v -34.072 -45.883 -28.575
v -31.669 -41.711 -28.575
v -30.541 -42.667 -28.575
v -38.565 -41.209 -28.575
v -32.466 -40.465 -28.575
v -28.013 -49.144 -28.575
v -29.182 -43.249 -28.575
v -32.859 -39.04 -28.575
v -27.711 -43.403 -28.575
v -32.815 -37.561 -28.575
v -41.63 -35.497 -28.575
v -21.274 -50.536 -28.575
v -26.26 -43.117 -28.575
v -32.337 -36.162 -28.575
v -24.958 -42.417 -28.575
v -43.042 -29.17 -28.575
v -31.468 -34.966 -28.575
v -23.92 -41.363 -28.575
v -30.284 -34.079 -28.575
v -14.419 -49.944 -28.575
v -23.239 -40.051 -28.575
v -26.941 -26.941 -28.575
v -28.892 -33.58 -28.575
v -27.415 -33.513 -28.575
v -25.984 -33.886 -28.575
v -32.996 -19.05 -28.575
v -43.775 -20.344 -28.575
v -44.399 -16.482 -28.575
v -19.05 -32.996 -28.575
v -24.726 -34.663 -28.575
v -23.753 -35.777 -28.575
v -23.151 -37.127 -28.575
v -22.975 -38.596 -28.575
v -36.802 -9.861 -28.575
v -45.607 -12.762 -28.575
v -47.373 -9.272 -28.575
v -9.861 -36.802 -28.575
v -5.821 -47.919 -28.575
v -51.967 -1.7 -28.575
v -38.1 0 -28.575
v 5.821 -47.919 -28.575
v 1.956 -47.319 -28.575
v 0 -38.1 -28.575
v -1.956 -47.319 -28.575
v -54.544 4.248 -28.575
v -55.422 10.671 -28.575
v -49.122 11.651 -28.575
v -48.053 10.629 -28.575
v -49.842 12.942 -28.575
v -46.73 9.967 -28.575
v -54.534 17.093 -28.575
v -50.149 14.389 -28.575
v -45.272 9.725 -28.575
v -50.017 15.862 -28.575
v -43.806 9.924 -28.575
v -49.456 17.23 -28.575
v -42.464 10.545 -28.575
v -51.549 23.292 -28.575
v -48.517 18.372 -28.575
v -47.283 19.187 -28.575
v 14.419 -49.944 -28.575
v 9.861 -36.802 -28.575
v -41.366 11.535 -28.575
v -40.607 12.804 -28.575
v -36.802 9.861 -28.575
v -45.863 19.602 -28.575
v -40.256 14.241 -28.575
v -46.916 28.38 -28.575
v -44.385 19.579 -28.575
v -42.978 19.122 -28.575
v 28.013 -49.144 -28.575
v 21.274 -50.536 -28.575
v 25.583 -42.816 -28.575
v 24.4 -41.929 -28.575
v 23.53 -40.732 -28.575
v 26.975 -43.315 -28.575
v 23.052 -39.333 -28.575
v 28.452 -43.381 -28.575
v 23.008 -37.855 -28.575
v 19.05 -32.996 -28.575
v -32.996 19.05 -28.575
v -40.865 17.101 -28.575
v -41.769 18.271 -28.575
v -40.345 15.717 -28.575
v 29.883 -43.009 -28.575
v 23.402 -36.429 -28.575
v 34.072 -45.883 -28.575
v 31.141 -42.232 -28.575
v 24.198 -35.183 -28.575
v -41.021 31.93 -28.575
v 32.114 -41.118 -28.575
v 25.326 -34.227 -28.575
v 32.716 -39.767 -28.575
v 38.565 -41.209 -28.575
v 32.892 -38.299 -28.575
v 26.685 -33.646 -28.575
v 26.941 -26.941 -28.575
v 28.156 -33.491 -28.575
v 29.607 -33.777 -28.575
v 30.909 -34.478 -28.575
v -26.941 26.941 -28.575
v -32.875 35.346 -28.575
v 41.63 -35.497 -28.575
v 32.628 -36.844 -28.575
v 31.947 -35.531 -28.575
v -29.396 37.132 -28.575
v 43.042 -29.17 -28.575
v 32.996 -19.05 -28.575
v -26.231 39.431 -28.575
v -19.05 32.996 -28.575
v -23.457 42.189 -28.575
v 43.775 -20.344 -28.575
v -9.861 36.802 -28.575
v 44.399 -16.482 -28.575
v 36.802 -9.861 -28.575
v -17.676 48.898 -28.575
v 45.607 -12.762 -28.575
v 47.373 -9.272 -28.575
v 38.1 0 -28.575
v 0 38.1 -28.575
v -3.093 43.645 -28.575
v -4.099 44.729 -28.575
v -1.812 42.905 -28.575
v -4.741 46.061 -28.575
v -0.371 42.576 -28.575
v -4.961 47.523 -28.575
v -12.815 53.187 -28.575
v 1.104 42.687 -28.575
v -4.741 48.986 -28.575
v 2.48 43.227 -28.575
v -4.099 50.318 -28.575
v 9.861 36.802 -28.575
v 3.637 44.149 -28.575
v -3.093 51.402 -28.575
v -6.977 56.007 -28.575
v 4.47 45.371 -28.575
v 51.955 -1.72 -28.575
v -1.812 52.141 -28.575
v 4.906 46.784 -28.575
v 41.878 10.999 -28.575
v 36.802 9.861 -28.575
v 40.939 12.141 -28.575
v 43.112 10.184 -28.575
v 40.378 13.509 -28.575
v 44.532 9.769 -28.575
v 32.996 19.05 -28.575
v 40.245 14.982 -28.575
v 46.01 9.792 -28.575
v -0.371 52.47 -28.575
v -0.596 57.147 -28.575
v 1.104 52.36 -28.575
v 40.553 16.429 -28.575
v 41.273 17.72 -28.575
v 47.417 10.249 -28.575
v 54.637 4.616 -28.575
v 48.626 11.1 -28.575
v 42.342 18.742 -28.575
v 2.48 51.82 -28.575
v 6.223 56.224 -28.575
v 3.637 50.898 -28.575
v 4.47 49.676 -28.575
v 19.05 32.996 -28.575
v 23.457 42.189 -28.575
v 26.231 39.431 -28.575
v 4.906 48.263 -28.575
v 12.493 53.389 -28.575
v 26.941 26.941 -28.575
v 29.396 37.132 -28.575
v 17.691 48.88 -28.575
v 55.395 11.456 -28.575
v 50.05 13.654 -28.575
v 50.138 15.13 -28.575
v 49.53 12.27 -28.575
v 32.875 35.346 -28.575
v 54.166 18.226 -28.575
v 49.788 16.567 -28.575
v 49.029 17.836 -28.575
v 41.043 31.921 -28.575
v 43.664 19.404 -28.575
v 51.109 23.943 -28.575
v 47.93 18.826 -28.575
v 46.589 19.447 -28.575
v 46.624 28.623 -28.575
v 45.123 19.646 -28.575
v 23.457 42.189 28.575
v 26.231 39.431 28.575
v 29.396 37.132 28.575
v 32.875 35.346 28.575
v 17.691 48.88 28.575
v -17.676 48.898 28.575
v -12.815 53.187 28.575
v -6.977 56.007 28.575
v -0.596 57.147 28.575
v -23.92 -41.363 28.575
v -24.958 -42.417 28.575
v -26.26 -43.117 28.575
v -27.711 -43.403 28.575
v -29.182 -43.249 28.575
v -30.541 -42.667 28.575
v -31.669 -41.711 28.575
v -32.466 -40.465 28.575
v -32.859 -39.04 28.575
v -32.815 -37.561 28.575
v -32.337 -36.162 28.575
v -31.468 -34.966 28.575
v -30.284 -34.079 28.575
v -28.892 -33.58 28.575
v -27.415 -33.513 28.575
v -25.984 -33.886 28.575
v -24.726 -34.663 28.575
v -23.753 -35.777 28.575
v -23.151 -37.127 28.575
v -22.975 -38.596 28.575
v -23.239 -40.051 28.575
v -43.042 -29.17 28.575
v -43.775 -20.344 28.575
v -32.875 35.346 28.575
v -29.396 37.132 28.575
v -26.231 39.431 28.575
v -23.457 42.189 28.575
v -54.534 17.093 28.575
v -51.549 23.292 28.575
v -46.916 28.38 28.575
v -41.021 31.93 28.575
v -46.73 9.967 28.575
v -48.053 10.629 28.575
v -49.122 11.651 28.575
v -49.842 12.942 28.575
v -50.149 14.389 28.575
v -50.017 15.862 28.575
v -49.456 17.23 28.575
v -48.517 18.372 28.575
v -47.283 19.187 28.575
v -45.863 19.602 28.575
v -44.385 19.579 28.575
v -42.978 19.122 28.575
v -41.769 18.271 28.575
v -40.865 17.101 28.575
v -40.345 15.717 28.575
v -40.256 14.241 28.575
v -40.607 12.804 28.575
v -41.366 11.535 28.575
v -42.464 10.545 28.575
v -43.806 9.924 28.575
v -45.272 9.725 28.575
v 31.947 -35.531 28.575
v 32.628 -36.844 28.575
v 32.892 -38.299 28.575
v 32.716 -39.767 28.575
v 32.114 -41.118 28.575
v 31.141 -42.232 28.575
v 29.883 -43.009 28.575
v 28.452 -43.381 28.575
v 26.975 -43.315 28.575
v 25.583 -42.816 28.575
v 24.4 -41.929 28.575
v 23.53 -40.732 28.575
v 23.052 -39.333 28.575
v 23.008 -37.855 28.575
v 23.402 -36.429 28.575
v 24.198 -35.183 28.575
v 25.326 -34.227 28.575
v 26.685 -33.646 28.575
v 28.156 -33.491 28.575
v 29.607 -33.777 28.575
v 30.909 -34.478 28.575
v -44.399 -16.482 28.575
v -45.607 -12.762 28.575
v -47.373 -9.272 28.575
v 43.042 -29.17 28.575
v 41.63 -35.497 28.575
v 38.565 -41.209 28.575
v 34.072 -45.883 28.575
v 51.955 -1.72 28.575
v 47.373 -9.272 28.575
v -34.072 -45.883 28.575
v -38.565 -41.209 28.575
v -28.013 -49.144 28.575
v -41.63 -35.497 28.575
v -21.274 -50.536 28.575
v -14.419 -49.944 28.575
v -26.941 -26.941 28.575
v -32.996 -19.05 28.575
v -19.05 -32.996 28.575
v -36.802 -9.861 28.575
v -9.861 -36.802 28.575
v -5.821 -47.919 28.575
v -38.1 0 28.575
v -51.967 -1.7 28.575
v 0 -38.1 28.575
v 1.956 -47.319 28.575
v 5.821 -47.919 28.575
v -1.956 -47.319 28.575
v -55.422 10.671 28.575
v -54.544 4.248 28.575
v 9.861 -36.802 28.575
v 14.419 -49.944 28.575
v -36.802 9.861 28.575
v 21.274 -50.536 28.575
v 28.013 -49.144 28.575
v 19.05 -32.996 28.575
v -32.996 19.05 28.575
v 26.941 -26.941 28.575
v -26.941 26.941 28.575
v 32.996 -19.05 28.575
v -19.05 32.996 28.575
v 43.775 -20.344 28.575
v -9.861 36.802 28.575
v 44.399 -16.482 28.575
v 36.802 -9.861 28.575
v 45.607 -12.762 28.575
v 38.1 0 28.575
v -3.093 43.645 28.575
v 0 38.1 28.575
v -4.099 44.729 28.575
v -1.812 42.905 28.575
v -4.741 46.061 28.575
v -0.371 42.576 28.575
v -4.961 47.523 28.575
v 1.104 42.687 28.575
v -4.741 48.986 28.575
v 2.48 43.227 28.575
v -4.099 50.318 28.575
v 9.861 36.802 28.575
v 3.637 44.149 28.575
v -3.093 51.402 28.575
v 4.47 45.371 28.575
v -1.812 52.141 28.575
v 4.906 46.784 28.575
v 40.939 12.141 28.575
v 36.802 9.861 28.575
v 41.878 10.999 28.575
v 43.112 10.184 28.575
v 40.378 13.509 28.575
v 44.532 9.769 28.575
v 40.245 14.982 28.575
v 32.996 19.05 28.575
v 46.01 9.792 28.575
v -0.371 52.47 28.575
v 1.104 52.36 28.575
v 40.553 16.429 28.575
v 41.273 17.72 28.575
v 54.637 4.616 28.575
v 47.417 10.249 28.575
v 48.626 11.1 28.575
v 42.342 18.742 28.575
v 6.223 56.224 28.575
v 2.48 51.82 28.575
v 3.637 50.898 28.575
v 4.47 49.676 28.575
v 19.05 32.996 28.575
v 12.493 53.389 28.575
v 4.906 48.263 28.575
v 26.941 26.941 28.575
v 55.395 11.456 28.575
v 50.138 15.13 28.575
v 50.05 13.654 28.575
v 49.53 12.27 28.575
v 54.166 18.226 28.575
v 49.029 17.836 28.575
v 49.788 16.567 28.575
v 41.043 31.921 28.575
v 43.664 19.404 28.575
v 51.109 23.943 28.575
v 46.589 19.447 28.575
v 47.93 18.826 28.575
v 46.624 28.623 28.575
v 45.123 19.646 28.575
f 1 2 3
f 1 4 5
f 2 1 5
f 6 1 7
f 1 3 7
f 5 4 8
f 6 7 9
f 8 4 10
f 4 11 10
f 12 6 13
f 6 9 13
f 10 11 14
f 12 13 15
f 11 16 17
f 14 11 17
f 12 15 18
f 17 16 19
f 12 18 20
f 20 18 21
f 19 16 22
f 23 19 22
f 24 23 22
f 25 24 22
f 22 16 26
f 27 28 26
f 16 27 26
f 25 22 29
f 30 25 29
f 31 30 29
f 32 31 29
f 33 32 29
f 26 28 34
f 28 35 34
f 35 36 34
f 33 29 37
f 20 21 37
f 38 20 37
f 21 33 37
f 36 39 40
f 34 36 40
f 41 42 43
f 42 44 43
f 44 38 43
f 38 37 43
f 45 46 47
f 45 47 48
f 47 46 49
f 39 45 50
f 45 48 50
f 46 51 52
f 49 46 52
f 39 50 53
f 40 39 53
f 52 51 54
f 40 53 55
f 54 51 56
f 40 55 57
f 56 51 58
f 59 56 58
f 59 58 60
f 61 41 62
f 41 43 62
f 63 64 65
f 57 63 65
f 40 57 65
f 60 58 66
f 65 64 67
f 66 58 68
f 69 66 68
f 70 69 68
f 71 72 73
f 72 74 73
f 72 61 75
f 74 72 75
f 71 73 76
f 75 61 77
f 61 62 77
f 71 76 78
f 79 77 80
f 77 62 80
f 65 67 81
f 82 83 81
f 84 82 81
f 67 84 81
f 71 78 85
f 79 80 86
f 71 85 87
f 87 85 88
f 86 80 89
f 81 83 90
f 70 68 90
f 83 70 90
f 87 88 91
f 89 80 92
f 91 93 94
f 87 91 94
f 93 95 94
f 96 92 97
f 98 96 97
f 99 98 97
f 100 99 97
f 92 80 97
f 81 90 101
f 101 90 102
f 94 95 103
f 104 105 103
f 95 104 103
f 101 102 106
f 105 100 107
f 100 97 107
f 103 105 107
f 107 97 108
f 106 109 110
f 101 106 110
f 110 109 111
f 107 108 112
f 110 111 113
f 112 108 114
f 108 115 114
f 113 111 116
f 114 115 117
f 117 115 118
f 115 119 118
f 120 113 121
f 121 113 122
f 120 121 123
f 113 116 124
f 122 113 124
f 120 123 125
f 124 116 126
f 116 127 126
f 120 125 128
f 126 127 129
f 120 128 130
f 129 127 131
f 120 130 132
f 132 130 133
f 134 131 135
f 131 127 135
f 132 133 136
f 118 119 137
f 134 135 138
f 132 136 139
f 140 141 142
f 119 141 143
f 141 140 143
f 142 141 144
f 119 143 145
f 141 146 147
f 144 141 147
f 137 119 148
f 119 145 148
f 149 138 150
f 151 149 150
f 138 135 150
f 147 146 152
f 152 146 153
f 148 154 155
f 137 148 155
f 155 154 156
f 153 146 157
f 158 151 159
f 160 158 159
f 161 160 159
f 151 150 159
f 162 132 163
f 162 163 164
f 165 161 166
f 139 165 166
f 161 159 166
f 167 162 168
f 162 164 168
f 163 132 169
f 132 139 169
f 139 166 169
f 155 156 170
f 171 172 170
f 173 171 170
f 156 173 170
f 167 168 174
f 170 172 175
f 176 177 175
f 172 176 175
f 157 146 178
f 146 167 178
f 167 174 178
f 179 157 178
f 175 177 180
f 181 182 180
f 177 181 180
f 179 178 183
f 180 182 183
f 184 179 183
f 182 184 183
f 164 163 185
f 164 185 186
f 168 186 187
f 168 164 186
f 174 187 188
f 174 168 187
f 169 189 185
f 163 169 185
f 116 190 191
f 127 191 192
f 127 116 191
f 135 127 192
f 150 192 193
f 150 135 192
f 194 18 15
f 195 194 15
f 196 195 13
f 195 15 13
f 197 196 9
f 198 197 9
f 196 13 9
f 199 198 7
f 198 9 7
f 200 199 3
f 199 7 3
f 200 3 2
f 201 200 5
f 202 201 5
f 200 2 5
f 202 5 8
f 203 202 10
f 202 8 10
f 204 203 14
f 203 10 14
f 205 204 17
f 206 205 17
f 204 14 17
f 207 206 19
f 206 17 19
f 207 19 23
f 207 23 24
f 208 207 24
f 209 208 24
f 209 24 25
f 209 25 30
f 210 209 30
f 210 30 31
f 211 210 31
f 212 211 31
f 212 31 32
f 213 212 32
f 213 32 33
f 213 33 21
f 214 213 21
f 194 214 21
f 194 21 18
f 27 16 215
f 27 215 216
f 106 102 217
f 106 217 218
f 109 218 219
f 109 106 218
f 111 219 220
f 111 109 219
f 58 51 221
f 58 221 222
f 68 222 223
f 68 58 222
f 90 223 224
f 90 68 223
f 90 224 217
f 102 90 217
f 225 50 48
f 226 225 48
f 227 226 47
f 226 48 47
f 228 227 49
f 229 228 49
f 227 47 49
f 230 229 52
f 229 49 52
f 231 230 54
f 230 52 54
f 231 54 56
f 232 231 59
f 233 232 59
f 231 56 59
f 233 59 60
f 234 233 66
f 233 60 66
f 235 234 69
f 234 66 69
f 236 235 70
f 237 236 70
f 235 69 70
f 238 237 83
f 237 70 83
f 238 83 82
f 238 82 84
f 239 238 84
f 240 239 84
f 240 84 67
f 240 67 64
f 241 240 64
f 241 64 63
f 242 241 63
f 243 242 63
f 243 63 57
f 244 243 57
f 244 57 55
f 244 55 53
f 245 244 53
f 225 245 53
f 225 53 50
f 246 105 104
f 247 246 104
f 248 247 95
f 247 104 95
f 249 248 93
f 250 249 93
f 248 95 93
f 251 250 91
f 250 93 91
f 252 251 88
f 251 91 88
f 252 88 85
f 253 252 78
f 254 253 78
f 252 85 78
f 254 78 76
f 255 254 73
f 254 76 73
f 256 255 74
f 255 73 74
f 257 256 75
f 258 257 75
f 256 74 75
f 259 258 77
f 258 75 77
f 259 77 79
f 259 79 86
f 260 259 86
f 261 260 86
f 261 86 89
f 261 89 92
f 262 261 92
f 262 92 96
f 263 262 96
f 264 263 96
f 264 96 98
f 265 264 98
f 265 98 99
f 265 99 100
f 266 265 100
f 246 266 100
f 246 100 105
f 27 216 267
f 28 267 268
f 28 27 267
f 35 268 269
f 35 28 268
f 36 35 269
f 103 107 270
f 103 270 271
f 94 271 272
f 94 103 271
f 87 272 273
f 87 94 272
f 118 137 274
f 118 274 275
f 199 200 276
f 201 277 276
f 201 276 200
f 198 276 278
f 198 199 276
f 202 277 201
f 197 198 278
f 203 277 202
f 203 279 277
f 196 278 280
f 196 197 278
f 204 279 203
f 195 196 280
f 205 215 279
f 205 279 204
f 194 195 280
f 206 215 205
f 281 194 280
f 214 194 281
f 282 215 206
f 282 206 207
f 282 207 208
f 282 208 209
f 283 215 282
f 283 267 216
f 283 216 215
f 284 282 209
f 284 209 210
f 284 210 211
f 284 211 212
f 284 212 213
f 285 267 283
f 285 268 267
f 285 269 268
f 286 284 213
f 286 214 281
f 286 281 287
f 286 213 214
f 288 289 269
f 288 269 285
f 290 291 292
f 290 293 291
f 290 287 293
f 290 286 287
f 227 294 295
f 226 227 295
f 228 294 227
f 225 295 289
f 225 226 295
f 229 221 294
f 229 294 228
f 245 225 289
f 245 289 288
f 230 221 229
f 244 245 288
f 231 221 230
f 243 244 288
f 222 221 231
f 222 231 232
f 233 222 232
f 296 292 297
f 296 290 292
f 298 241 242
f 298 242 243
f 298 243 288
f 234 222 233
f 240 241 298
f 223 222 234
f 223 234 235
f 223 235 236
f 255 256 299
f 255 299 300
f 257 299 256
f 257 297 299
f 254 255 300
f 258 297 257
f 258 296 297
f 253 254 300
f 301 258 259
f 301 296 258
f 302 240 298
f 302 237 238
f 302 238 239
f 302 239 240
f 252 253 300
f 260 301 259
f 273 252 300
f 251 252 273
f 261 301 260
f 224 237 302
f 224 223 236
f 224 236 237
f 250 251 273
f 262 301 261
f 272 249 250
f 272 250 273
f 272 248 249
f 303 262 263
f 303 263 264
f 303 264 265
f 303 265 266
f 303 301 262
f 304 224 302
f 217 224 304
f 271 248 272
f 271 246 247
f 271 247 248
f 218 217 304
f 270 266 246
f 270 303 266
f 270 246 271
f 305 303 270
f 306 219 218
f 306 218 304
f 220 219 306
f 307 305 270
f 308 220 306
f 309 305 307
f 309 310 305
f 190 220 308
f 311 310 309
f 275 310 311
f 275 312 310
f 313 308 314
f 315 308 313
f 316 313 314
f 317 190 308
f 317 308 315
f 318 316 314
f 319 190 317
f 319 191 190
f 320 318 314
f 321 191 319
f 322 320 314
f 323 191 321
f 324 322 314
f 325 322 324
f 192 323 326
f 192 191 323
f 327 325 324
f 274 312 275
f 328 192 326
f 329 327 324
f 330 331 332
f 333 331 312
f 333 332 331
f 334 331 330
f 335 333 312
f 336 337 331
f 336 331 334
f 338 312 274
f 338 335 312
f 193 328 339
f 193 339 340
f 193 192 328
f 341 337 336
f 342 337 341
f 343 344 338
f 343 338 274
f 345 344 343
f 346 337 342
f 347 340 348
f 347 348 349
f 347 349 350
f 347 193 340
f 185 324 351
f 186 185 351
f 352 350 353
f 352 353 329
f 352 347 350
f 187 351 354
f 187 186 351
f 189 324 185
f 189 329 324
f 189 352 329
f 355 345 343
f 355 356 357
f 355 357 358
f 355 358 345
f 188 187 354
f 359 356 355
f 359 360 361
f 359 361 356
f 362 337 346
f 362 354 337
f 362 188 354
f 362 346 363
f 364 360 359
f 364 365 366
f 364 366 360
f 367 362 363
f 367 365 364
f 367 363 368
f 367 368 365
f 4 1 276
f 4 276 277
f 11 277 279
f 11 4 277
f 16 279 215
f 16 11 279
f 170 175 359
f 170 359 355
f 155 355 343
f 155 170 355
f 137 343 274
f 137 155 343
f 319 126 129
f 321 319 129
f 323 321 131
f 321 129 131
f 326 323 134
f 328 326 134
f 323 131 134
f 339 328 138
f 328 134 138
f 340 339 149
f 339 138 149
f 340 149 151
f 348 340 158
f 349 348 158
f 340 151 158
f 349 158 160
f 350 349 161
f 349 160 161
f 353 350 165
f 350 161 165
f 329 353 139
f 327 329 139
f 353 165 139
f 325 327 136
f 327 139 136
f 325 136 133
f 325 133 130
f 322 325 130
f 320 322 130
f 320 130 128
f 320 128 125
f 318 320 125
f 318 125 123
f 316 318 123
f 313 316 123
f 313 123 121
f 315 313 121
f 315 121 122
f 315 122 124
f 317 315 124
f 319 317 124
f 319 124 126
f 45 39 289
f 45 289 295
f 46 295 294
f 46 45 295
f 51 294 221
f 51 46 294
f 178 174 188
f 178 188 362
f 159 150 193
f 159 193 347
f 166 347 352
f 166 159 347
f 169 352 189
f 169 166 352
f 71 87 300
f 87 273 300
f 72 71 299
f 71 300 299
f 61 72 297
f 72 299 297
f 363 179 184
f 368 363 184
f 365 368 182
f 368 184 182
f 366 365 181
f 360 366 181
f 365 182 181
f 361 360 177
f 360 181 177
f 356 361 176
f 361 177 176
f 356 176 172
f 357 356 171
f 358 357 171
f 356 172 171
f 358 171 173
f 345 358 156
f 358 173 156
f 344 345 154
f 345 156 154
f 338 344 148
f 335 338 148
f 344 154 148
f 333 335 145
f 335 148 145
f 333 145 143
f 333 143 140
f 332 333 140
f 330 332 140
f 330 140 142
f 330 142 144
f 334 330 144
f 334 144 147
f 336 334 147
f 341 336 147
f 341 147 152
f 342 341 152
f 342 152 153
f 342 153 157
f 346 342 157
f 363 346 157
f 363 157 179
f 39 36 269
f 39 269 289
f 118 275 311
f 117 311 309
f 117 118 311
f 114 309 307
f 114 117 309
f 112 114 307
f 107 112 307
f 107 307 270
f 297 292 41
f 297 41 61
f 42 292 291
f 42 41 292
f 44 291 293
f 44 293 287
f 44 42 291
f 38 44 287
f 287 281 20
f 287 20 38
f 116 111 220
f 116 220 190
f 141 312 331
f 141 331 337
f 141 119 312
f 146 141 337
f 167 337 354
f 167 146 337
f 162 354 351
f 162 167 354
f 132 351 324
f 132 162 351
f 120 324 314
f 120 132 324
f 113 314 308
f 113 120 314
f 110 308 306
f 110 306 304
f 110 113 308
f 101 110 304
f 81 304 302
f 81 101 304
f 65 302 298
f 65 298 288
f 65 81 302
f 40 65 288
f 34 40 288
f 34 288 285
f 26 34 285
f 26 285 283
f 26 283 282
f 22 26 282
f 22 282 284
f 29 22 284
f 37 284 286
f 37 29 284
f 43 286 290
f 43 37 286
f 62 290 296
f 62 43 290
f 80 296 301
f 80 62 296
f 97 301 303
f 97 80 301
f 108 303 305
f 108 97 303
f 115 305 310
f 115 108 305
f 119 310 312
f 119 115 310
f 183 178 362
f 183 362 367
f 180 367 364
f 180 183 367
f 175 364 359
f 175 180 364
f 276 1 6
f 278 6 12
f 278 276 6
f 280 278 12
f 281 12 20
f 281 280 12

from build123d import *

# Parameters (mm, degrees)
SKETCH1_R                        = 57.15
SKETCH1_R_2                      = 38.1
BOSS_EXTRUDE1_DEPTH              = 28.575
F_25_64_0_39063_DIAMETER_HOLE2_D = 9.921875
CIRPATTERN2_COUNT                = 5
CUT_EXTRUDE2_DEPTH               = 99.986703653
FILLET1_R                        = 23.8125
FILLET2_R                        = 25.4
CIRPATTERN1_START                = -28.575
CIRPATTERN1_DEPTH                = 57.15


# Read off the part's stored shape, not the designer's step: CirPattern1
with BuildPart() as part:
    # Sketch1 → Boss-Extrude1 (new, symmetric)
    with BuildSketch(Plane.XY):
        Circle(SKETCH1_R)
        Circle(SKETCH1_R_2, mode=Mode.SUBTRACT)
    extrude(amount=BOSS_EXTRUDE1_DEPTH, both=True)

    # 25/64 (0.39063) Diameter Hole2 (through all)
    with Locations(Plane.XY.offset(28.575)):
        with Locations((0, 47.5234)):
            f_25_64_0_39063_diameter_hole2 = Hole(F_25_64_0_39063_DIAMETER_HOLE2_D / 2)

    # CirPattern2: 25/64 (0.39063) Diameter Hole2 ×5 about axis
    cirpattern2_axis = Axis((0, 0, 0), (0, 0, 1))
    for i in range(1, CIRPATTERN2_COUNT):
        add(f_25_64_0_39063_diameter_hole2.rotate(cirpattern2_axis, i * 360 / CIRPATTERN2_COUNT), mode=Mode.SUBTRACT)

    # Sketch5 → Cut-Extrude2 (cut, through all)
    with BuildSketch(Plane.XY.offset(28.575)):
        Polygon((0, -46.54915497), (88.85993875, -67.46875), (-88.85993875, -67.46875), align=None)
    extrude(amount=-CUT_EXTRUDE2_DEPTH, mode=Mode.SUBTRACT)

    # Fillet1
    fillet1_edges = [part.edges().sort_by_distance(p)[0] for p in [
        (23.519318129, -52.086122669, 0),
        (-23.519318129, -52.086122669, 0),
    ]]
    fillet(fillet1_edges, radius=FILLET1_R)

    # Fillet2
    fillet2_edges = [part.edges().sort_by_distance(p)[0] for p in [
        (0, -46.54915497, 0),
    ]]
    fillet(fillet2_edges, radius=FILLET2_R)

    # CirPattern1 outline → CirPattern1 (cut)
    with BuildSketch(Plane.XY.offset(CIRPATTERN1_START)):
        with BuildLine():
            ThreePointArc((-43.775443864, -20.343642549), (-44.931279172, -14.59905758), (-47.372771091, -9.272207766))
            Line((-47.372771091, -9.272207766), (-51.967174053, -1.7001118))
            ThreePointArc((-51.967174053, -1.7001118), (-55.202463072, 7.429620219), (-54.5340897, 17.092558633))
            ThreePointArc((-54.5340897, 17.092558633), (-54.352879906, -17.660321229), (-34.072251451, -45.882504084))
            ThreePointArc((-34.072251451, -45.882504084), (-40.292709561, -38.457882702), (-43.041627602, -29.170119173))
            Line((-43.041627602, -29.170119173), (-43.775443864, -20.343642549))
        make_face()
        with BuildLine():
            ThreePointArc((34.072251451, -45.882504084), (54.534089699, -17.092558633), (54.165759228, 18.226163261))
            ThreePointArc((54.165759228, 18.226163261), (55.264246489, 8.008560011), (51.954827504, -1.72046031))
            Line((51.954827504, -1.72046031), (47.372771091, -9.272207766))
            ThreePointArc((47.372771091, -9.272207766), (44.931279172, -14.59905758), (43.775443864, -20.343642549))
            Line((43.775443864, -20.343642549), (43.041627602, -29.170119173))
            ThreePointArc((43.041627602, -29.170119173), (40.292709561, -38.457882702), (34.072251451, -45.882504084))
        make_face()
        with BuildLine():
            ThreePointArc((54.165759228, 18.226163261), (33.107949758, 46.583110274), (-0.595971221, 57.146892464))
            ThreePointArc((-0.595971221, 57.146892464), (9.460998162, 55.034202885), (17.691179628, 48.880325777))
            Line((17.691179628, 48.880325777), (23.457384954, 42.188912866))
            ThreePointArc((23.457384954, 42.188912866), (27.769057686, 38.220828948), (32.875309902, 35.346389866))
            Line((32.875309902, 35.346389866), (41.043026315, 31.92095785))
            ThreePointArc((41.043026315, 31.92095785), (49.026751951, 26.436504665), (54.165759228, 18.226163261))
        make_face()
        with BuildLine():
            ThreePointArc((-0.595971221, 57.146892464), (-34.072251451, 45.882504084), (-54.5340897, 17.092558633))
            ThreePointArc((-54.5340897, 17.092558633), (-49.417028058, 26.004447915), (-41.021077193, 31.930163021))
            Line((-41.021077193, 31.930163021), (-32.875309902, 35.346389866))
            ThreePointArc((-32.875309902, 35.346389866), (-27.769057686, 38.220828948), (-23.457384954, 42.188912866))
            Line((-23.457384954, 42.188912866), (-17.675642338, 48.898356078))
            ThreePointArc((-17.675642338, 48.898356078), (-9.992510498, 54.796541129), (-0.595971221, 57.146892464))
        make_face()
    extrude(amount=CIRPATTERN1_DEPTH, mode=Mode.SUBTRACT)


solid = part.part
